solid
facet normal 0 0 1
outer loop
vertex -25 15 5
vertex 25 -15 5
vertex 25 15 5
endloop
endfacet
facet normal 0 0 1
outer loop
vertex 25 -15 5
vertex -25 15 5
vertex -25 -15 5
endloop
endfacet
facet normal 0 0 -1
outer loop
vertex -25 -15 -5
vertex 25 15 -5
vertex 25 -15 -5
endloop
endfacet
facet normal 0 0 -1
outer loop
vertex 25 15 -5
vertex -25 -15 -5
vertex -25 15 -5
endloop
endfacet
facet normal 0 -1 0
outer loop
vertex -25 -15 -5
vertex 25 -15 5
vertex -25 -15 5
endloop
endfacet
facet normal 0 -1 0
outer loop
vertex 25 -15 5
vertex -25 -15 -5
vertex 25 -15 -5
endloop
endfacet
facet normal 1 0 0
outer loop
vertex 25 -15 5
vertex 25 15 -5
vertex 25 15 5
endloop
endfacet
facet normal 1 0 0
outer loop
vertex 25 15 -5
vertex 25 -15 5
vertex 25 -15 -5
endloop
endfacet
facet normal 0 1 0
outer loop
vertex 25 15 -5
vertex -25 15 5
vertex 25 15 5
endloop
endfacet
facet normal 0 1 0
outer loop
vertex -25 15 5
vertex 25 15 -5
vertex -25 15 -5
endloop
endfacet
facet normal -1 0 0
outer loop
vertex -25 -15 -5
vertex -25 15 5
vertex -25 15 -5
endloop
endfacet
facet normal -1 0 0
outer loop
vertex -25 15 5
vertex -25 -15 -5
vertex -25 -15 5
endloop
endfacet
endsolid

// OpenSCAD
// Parameters
body_length = 50; //[25:100:1]
body_width  = 30; //[15:60:1]
body_height = 10; //[5:20:1]

// Robust, non-zero dimensions (prevents blank renders)
eps = 0.01;
L = max(body_length, eps);
W = max(body_width,  eps);
H = max(body_height, eps);

// Main Body Module
module main_body() {
  cube([L, W, H], center=true);
}

// Final Model (one connected solid)
color([0.85, 0.85, 0.8])
union() {
  main_body();
}
